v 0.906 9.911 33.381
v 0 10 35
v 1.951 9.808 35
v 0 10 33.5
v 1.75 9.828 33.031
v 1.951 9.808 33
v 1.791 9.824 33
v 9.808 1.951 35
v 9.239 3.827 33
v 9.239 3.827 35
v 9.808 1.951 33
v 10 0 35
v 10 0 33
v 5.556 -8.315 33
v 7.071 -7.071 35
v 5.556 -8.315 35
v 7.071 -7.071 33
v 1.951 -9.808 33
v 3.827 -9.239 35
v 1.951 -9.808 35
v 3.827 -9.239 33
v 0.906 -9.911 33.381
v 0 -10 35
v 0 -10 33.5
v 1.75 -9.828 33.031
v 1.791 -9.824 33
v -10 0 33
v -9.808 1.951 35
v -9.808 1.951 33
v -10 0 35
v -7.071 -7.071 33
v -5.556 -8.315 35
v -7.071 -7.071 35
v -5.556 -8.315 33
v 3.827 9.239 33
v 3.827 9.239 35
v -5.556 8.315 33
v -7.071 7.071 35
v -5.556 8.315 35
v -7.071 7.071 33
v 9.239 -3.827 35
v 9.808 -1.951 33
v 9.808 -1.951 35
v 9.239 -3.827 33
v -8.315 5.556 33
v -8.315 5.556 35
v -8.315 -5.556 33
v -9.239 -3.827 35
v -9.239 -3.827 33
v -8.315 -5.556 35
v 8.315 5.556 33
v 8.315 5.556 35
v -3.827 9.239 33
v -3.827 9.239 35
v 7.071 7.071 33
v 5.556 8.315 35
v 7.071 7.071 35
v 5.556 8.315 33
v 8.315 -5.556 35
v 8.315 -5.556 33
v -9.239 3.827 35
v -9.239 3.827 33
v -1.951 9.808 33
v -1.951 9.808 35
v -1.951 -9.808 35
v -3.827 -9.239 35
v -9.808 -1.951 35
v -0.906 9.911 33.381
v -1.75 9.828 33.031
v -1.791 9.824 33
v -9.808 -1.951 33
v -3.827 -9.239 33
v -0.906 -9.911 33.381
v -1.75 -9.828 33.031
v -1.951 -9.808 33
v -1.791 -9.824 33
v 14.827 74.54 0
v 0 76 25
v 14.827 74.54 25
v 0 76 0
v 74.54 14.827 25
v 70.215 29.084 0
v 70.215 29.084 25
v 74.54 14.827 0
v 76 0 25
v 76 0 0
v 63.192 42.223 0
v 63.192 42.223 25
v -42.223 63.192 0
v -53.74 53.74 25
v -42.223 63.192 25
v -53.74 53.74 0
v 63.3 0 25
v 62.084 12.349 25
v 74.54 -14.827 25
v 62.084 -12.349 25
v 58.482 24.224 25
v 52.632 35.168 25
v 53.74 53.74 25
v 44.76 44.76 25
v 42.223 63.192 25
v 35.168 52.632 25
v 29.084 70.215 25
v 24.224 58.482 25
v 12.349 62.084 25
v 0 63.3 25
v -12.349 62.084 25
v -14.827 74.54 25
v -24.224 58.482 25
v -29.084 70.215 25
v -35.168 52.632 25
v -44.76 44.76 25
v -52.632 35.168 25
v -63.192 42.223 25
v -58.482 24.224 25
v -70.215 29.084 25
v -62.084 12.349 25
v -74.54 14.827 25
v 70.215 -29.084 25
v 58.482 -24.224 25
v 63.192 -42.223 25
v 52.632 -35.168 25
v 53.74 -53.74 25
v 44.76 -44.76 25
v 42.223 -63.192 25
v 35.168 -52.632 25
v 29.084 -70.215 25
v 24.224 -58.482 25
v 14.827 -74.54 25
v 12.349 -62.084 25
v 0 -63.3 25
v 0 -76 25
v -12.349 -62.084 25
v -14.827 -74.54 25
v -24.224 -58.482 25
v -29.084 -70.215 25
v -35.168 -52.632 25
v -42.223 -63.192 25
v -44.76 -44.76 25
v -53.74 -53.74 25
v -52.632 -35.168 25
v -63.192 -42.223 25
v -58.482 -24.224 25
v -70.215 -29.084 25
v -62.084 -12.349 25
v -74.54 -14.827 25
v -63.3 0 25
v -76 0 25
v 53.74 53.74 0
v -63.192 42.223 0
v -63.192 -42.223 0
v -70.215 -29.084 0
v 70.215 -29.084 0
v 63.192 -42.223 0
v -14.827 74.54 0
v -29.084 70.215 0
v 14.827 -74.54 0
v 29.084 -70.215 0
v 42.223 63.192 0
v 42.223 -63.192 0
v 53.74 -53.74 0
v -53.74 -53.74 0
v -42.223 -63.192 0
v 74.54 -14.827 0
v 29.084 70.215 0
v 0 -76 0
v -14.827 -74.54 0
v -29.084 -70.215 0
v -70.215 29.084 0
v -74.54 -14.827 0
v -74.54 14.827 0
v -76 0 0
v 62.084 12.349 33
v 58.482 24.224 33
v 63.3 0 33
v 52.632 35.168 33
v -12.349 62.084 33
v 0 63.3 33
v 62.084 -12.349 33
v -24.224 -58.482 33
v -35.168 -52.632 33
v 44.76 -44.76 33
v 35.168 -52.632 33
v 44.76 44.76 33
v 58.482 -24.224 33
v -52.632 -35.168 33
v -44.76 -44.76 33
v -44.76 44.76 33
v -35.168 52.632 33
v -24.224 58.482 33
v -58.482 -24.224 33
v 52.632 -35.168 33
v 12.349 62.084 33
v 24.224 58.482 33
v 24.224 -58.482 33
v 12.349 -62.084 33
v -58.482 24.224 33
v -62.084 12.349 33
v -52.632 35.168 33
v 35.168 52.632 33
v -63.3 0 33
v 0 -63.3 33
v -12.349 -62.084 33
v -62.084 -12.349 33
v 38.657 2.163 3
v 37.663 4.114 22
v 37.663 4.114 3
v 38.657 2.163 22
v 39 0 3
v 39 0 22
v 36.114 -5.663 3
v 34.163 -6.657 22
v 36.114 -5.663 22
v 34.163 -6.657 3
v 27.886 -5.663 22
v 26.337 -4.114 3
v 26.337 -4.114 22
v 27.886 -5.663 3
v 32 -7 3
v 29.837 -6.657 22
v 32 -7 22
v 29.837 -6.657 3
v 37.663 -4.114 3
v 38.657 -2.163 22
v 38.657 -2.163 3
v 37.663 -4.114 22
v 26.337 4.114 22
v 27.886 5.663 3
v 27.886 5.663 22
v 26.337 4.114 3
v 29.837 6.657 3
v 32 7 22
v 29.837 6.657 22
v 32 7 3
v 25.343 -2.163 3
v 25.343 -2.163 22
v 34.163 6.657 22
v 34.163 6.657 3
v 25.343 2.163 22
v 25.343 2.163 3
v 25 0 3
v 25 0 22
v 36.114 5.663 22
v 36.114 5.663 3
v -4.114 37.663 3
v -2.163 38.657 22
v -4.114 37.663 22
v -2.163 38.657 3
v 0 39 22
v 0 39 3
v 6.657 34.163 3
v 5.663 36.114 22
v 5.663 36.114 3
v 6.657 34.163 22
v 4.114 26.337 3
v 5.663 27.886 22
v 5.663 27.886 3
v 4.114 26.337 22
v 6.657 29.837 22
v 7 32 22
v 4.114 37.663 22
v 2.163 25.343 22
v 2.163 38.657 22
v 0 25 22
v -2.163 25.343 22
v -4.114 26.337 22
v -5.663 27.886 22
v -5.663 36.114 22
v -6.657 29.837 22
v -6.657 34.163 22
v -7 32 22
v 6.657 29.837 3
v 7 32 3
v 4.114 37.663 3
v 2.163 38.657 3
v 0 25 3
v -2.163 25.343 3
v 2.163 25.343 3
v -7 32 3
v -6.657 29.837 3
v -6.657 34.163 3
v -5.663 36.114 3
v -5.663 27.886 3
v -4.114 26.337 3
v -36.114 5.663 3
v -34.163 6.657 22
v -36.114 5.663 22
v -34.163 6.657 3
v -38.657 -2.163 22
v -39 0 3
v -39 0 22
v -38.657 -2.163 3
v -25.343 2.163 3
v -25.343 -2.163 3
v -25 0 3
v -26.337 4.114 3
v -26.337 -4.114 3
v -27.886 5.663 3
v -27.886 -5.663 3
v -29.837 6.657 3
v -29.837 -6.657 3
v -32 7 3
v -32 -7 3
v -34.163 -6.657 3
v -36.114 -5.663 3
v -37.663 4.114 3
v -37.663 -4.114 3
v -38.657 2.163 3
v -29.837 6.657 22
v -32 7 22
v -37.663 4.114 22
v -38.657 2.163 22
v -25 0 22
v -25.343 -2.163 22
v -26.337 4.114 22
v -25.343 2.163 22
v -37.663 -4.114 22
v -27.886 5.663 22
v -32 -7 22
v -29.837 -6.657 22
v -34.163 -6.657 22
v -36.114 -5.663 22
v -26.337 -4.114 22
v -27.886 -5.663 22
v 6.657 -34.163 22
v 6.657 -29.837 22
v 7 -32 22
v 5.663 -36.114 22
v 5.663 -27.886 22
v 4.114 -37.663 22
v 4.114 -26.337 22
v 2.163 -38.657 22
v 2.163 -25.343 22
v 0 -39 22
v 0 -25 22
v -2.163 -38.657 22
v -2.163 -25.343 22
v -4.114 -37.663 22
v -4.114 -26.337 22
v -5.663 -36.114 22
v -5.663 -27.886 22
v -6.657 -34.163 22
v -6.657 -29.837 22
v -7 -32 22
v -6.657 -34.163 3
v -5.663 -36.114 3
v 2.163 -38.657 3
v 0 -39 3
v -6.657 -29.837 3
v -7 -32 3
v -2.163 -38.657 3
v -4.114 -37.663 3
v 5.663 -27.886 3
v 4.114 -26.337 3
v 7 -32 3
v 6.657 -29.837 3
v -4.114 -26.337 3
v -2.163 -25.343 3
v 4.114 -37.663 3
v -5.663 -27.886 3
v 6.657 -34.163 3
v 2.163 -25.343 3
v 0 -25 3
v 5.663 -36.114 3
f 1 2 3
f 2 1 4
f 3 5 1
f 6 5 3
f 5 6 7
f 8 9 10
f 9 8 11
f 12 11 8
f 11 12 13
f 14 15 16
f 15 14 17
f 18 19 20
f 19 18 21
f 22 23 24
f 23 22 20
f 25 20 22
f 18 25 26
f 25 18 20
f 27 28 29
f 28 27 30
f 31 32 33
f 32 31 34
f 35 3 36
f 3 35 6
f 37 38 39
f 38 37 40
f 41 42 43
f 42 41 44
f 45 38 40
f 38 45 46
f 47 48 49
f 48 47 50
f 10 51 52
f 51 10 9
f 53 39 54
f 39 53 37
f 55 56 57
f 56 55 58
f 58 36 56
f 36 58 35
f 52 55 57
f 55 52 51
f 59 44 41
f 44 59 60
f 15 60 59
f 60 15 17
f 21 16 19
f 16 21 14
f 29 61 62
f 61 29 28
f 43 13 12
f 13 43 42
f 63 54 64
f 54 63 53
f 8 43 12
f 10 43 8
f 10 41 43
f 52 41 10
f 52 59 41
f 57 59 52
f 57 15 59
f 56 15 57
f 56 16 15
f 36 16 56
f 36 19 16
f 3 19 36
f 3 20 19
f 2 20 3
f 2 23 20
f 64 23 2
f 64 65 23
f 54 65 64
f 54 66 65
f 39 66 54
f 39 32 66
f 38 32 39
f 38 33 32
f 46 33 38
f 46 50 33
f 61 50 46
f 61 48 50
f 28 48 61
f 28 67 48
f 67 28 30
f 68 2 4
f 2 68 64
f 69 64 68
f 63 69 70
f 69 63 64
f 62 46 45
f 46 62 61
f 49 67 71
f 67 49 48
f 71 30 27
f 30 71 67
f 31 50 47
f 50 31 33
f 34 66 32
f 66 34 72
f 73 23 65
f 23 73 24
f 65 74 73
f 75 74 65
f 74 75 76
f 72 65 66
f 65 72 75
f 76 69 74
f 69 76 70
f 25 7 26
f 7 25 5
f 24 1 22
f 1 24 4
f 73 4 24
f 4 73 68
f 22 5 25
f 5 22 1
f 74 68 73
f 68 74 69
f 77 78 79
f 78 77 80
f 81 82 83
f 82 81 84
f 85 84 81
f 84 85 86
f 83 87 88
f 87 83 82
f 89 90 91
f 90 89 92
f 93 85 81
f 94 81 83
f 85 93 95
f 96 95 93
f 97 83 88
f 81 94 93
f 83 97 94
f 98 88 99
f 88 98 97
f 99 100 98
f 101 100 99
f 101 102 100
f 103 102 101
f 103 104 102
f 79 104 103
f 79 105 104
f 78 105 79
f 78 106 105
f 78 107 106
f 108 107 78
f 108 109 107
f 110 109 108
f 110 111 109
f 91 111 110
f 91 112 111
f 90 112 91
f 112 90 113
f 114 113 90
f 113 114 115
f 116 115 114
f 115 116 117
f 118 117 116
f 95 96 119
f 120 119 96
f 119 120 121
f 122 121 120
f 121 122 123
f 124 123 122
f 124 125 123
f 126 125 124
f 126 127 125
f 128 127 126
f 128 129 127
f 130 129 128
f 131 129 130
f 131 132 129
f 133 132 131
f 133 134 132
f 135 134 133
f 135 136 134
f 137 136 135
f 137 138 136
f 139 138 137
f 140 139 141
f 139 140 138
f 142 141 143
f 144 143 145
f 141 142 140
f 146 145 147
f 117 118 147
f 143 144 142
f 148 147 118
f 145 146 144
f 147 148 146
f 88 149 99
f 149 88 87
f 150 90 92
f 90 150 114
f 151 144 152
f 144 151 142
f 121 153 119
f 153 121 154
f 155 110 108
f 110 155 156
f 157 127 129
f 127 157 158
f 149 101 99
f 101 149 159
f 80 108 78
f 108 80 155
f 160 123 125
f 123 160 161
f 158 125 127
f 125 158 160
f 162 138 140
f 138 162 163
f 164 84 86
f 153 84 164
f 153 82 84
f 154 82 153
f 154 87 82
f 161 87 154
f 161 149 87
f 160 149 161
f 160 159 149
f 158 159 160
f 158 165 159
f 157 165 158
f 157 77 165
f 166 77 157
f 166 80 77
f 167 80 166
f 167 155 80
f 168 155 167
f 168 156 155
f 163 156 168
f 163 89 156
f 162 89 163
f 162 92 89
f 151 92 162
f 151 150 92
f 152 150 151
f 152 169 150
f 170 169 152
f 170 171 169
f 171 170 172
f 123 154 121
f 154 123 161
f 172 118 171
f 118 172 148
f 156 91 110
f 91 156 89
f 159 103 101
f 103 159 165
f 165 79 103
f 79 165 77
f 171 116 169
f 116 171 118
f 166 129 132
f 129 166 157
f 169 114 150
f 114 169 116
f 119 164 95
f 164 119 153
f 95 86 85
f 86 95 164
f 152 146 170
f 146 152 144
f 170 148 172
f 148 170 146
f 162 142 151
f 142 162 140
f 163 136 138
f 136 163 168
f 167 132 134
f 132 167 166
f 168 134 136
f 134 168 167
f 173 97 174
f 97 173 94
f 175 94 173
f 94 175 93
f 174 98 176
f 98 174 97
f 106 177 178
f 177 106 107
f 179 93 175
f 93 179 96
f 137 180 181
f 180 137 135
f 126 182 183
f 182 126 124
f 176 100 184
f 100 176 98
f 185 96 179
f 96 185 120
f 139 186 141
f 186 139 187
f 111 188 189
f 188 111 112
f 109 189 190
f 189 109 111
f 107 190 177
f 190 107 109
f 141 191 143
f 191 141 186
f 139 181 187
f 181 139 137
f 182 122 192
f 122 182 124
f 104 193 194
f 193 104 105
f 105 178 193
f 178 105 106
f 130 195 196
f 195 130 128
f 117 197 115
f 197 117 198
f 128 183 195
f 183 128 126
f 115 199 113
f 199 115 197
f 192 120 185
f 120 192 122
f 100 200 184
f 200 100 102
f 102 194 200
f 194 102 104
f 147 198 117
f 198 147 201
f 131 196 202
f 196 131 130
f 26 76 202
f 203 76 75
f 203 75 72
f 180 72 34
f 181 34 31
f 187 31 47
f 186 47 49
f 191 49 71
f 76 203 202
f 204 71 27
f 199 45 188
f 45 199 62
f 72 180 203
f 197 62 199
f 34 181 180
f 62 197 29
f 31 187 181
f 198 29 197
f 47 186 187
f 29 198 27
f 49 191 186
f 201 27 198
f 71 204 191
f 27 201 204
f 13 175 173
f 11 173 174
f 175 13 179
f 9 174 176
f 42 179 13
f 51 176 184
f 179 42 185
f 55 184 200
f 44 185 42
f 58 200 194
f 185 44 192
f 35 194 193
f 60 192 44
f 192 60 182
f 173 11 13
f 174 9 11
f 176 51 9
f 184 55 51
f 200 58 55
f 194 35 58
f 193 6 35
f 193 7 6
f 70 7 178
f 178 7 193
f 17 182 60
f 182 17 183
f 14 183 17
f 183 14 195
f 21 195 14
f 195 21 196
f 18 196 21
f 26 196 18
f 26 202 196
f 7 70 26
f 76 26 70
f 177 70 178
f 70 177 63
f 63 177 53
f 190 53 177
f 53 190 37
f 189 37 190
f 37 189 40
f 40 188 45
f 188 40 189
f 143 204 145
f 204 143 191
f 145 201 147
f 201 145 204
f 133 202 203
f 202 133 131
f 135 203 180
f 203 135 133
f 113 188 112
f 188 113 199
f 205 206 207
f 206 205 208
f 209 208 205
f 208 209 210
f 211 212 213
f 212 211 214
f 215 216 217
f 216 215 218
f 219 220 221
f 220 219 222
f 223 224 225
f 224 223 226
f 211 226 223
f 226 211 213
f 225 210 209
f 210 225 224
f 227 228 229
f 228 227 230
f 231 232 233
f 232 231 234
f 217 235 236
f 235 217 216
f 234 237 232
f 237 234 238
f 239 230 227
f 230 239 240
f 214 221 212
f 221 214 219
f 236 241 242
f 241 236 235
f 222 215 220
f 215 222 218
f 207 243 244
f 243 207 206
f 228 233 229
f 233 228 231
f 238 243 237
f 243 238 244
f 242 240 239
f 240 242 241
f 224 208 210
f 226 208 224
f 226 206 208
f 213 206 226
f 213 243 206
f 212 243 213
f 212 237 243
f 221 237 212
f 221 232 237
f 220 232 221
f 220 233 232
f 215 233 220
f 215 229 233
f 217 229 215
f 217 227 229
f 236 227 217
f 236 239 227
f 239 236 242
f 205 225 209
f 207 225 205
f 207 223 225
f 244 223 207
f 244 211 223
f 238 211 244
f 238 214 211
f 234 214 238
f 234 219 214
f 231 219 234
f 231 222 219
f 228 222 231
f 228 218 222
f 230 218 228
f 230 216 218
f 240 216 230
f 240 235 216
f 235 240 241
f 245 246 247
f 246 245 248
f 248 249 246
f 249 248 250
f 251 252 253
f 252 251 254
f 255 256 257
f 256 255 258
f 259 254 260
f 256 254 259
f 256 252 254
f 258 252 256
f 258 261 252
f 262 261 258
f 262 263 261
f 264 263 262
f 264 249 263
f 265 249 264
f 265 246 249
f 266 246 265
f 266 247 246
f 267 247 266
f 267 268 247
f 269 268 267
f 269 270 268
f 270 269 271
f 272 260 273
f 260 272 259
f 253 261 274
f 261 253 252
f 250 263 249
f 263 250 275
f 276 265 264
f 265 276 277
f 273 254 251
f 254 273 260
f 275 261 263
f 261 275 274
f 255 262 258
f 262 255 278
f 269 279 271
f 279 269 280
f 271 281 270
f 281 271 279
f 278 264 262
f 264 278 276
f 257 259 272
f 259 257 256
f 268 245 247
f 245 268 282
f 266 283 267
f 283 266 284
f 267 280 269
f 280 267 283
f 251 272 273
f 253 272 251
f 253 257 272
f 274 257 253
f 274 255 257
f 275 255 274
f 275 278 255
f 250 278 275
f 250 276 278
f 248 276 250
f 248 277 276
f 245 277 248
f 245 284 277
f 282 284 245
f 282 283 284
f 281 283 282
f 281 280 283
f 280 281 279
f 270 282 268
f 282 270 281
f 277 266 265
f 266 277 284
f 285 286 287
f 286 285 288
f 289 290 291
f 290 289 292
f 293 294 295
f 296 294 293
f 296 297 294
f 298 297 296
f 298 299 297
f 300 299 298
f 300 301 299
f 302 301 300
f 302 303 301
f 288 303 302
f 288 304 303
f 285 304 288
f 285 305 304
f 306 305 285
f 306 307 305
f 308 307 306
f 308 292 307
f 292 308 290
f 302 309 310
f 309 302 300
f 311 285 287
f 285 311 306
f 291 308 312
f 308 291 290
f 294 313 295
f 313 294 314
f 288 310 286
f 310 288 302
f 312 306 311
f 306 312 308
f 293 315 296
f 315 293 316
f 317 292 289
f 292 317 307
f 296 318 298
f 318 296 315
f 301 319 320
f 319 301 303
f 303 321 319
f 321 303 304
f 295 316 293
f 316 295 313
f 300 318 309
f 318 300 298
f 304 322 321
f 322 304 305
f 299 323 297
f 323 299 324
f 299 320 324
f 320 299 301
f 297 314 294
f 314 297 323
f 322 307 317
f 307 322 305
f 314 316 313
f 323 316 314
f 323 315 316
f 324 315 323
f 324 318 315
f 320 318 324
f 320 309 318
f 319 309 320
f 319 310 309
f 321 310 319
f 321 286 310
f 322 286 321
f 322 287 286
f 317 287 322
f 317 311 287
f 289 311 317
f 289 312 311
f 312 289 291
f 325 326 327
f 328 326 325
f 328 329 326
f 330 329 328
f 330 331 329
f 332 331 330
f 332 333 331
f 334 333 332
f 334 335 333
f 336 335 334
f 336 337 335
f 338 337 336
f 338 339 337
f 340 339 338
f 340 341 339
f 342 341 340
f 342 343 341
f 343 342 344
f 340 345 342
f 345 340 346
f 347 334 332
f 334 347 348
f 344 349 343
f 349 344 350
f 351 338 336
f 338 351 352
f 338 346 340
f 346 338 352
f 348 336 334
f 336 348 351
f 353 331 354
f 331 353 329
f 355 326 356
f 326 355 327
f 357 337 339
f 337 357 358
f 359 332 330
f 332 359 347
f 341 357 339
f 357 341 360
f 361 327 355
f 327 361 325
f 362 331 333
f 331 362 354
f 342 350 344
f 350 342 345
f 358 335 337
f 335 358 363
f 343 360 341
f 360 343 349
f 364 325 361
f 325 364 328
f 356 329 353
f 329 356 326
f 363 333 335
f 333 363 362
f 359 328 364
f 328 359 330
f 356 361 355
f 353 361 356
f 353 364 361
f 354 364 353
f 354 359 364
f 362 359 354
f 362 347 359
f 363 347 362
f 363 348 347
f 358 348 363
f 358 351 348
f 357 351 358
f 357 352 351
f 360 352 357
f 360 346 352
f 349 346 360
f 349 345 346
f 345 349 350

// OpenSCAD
// file: _constants.scad
// =============================================================================
// GymRollerBag — Shared Constants & Modules
// =============================================================================
// All dimensional constants in millimeters (mm).
// All component files must: include <_constants.scad>
//
// Rendering tip: Change $fn to 32 for fast development previews,
// set to 128 for final STL export.
// =============================================================================

// --- Dimensional Constants ---
OUTER_DIAMETER  = 152;    // EVA foam shell outer diameter (6 inches)
INNER_DIAMETER  = 127;    // Inner storage cavity diameter (5 inches)
WALL_THICKNESS  = 12.7;   // Foam wall thickness (0.5 inches)
BODY_LENGTH     = 457;    // Roller body length (18 inches)
CAP_HEIGHT      = 25;     // Depth of each end cap
CAP_PLUG_EXTRA  = 8;      // How far the cap plug extends into the body
THREAD_PITCH    = 3;      // Helical thread pitch for removable cap
THREAD_DEPTH    = 1.5;    // Thread profile depth (radial)
GROOVE_DEPTH    = 3;      // Surface texture groove depth
GROOVE_WIDTH    = 5;      // Surface texture groove width
GROOVE_SPACING  = 20;     // Axial distance between grooves
D_RING_WIDTH    = 38;     // D-ring inner width (matches 38mm webbing)
BOSS_DIAMETER   = 20;     // Strap boss outer diameter
BOSS_HEIGHT     = 10;     // Strap boss height above cap face
BOSS_HOLE_DIA   = 7;      // Through-hole for D-ring bar
FIT_TOLERANCE   = 0.4;    // Press-fit clearance (subtract from plug OD)

// --- Render Quality ---
// Comment out one line depending on mode:
$fn = 32;   // Development (fast preview)
// $fn = 128;  // Production (smooth STL export)

// =============================================================================
// Shared Module: strap_boss()
// A raised cylindrical boss on a cap face with a horizontal bar hole
// for threading the D-ring cross-bar through.
// Centered at [0,0,0] — caller must translate to correct position.
// =============================================================================
module strap_boss() {
    difference() {
        // Boss cylinder
        cylinder(h=BOSS_HEIGHT, d=BOSS_DIAMETER, $fn=32);

        // Horizontal through-hole for D-ring bar
        translate([0, -(BOSS_DIAMETER), BOSS_HEIGHT / 2])
            rotate([-90, 0, 0])
                cylinder(h=BOSS_DIAMETER * 2, d=BOSS_HOLE_DIA, $fn=24);
    }
}

// =============================================================================
// Shared Module: thread_helix(diameter, pitch, length, external)
// Generates a helical thread profile using twisted extrusion.
// external=true  → external thread (used on roller body end)
// external=false → internal thread (used inside removable cap plug)
// =============================================================================
module thread_helix(diameter, pitch, length, external=true) {
    turns = length / pitch;
    total_angle = turns * 360;
    r = diameter / 2;

    // Triangle tooth profile
    tooth_h = THREAD_DEPTH;
    tooth_w = pitch * 0.6;

    sign = external ? 1 : -1;

    linear_extrude(
        height    = length,
        twist     = -total_angle,
        slices    = turns * 24,
        $fn       = 48
    )
    // Thread tooth positioned at the thread radius
    translate([r + sign * (tooth_h / 2), 0, 0])
        polygon([
            [-tooth_h / 2, -tooth_w / 2],
            [ tooth_h / 2,  0           ],
            [-tooth_h / 2,  tooth_w / 2 ]
        ]);
}
// main file
// =============================================================================
// GymRollerBag — Fixed End Cap
// =============================================================================
// The sealed, non-removable end cap. Glued or press-fit into the
// fixed-end socket of the roller body.
//
// Print settings: ABS or PETG, 30% gyroid infill, 3 perimeters.
//
// Features:
//   - Outer disk flush with roller OD
//   - Inner plug with press-fit tolerance for body socket
//   - Strap boss on outer face for D-ring bar attachment
//   - Lightening pockets to reduce material usage
// =============================================================================

include <_constants.scad>

STANDALONE = true;

// --- Lightening Pocket ---
// Four symmetric cylindrical voids inside the cap disk to save material
// while maintaining structural integrity.
module lightening_pocket() {
    pocket_r  = (OUTER_DIAMETER / 4) - 6;
    pocket_d  = 14;
    pocket_h  = CAP_HEIGHT - 6;  // leave 6mm floor

    for (angle = [0, 90, 180, 270])
        rotate([0, 0, angle])
            translate([pocket_r, 0, 3])
                cylinder(h=pocket_h, d=pocket_d, $fn=20);
}

// --- Fixed End Cap ---
module end_cap_fixed() {
    difference() {
        union() {
            // Outer disk — flush with roller outer diameter
            cylinder(h=CAP_HEIGHT, d=OUTER_DIAMETER, $fn=$fn);

            // Inner plug — extends into body socket
            // Slightly undersized by FIT_TOLERANCE for press fit
            cylinder(
                h  = CAP_HEIGHT + CAP_PLUG_EXTRA,
                d  = INNER_DIAMETER - FIT_TOLERANCE,
                $fn = $fn
            );

            // Strap boss on outer face (top surface)
            translate([0, 0, CAP_HEIGHT])
                strap_boss();
        }

        // Lightening pockets — cut into the disk (not the plug)
        lightening_pocket();
    }
}

if (STANDALONE) end_cap_fixed();
